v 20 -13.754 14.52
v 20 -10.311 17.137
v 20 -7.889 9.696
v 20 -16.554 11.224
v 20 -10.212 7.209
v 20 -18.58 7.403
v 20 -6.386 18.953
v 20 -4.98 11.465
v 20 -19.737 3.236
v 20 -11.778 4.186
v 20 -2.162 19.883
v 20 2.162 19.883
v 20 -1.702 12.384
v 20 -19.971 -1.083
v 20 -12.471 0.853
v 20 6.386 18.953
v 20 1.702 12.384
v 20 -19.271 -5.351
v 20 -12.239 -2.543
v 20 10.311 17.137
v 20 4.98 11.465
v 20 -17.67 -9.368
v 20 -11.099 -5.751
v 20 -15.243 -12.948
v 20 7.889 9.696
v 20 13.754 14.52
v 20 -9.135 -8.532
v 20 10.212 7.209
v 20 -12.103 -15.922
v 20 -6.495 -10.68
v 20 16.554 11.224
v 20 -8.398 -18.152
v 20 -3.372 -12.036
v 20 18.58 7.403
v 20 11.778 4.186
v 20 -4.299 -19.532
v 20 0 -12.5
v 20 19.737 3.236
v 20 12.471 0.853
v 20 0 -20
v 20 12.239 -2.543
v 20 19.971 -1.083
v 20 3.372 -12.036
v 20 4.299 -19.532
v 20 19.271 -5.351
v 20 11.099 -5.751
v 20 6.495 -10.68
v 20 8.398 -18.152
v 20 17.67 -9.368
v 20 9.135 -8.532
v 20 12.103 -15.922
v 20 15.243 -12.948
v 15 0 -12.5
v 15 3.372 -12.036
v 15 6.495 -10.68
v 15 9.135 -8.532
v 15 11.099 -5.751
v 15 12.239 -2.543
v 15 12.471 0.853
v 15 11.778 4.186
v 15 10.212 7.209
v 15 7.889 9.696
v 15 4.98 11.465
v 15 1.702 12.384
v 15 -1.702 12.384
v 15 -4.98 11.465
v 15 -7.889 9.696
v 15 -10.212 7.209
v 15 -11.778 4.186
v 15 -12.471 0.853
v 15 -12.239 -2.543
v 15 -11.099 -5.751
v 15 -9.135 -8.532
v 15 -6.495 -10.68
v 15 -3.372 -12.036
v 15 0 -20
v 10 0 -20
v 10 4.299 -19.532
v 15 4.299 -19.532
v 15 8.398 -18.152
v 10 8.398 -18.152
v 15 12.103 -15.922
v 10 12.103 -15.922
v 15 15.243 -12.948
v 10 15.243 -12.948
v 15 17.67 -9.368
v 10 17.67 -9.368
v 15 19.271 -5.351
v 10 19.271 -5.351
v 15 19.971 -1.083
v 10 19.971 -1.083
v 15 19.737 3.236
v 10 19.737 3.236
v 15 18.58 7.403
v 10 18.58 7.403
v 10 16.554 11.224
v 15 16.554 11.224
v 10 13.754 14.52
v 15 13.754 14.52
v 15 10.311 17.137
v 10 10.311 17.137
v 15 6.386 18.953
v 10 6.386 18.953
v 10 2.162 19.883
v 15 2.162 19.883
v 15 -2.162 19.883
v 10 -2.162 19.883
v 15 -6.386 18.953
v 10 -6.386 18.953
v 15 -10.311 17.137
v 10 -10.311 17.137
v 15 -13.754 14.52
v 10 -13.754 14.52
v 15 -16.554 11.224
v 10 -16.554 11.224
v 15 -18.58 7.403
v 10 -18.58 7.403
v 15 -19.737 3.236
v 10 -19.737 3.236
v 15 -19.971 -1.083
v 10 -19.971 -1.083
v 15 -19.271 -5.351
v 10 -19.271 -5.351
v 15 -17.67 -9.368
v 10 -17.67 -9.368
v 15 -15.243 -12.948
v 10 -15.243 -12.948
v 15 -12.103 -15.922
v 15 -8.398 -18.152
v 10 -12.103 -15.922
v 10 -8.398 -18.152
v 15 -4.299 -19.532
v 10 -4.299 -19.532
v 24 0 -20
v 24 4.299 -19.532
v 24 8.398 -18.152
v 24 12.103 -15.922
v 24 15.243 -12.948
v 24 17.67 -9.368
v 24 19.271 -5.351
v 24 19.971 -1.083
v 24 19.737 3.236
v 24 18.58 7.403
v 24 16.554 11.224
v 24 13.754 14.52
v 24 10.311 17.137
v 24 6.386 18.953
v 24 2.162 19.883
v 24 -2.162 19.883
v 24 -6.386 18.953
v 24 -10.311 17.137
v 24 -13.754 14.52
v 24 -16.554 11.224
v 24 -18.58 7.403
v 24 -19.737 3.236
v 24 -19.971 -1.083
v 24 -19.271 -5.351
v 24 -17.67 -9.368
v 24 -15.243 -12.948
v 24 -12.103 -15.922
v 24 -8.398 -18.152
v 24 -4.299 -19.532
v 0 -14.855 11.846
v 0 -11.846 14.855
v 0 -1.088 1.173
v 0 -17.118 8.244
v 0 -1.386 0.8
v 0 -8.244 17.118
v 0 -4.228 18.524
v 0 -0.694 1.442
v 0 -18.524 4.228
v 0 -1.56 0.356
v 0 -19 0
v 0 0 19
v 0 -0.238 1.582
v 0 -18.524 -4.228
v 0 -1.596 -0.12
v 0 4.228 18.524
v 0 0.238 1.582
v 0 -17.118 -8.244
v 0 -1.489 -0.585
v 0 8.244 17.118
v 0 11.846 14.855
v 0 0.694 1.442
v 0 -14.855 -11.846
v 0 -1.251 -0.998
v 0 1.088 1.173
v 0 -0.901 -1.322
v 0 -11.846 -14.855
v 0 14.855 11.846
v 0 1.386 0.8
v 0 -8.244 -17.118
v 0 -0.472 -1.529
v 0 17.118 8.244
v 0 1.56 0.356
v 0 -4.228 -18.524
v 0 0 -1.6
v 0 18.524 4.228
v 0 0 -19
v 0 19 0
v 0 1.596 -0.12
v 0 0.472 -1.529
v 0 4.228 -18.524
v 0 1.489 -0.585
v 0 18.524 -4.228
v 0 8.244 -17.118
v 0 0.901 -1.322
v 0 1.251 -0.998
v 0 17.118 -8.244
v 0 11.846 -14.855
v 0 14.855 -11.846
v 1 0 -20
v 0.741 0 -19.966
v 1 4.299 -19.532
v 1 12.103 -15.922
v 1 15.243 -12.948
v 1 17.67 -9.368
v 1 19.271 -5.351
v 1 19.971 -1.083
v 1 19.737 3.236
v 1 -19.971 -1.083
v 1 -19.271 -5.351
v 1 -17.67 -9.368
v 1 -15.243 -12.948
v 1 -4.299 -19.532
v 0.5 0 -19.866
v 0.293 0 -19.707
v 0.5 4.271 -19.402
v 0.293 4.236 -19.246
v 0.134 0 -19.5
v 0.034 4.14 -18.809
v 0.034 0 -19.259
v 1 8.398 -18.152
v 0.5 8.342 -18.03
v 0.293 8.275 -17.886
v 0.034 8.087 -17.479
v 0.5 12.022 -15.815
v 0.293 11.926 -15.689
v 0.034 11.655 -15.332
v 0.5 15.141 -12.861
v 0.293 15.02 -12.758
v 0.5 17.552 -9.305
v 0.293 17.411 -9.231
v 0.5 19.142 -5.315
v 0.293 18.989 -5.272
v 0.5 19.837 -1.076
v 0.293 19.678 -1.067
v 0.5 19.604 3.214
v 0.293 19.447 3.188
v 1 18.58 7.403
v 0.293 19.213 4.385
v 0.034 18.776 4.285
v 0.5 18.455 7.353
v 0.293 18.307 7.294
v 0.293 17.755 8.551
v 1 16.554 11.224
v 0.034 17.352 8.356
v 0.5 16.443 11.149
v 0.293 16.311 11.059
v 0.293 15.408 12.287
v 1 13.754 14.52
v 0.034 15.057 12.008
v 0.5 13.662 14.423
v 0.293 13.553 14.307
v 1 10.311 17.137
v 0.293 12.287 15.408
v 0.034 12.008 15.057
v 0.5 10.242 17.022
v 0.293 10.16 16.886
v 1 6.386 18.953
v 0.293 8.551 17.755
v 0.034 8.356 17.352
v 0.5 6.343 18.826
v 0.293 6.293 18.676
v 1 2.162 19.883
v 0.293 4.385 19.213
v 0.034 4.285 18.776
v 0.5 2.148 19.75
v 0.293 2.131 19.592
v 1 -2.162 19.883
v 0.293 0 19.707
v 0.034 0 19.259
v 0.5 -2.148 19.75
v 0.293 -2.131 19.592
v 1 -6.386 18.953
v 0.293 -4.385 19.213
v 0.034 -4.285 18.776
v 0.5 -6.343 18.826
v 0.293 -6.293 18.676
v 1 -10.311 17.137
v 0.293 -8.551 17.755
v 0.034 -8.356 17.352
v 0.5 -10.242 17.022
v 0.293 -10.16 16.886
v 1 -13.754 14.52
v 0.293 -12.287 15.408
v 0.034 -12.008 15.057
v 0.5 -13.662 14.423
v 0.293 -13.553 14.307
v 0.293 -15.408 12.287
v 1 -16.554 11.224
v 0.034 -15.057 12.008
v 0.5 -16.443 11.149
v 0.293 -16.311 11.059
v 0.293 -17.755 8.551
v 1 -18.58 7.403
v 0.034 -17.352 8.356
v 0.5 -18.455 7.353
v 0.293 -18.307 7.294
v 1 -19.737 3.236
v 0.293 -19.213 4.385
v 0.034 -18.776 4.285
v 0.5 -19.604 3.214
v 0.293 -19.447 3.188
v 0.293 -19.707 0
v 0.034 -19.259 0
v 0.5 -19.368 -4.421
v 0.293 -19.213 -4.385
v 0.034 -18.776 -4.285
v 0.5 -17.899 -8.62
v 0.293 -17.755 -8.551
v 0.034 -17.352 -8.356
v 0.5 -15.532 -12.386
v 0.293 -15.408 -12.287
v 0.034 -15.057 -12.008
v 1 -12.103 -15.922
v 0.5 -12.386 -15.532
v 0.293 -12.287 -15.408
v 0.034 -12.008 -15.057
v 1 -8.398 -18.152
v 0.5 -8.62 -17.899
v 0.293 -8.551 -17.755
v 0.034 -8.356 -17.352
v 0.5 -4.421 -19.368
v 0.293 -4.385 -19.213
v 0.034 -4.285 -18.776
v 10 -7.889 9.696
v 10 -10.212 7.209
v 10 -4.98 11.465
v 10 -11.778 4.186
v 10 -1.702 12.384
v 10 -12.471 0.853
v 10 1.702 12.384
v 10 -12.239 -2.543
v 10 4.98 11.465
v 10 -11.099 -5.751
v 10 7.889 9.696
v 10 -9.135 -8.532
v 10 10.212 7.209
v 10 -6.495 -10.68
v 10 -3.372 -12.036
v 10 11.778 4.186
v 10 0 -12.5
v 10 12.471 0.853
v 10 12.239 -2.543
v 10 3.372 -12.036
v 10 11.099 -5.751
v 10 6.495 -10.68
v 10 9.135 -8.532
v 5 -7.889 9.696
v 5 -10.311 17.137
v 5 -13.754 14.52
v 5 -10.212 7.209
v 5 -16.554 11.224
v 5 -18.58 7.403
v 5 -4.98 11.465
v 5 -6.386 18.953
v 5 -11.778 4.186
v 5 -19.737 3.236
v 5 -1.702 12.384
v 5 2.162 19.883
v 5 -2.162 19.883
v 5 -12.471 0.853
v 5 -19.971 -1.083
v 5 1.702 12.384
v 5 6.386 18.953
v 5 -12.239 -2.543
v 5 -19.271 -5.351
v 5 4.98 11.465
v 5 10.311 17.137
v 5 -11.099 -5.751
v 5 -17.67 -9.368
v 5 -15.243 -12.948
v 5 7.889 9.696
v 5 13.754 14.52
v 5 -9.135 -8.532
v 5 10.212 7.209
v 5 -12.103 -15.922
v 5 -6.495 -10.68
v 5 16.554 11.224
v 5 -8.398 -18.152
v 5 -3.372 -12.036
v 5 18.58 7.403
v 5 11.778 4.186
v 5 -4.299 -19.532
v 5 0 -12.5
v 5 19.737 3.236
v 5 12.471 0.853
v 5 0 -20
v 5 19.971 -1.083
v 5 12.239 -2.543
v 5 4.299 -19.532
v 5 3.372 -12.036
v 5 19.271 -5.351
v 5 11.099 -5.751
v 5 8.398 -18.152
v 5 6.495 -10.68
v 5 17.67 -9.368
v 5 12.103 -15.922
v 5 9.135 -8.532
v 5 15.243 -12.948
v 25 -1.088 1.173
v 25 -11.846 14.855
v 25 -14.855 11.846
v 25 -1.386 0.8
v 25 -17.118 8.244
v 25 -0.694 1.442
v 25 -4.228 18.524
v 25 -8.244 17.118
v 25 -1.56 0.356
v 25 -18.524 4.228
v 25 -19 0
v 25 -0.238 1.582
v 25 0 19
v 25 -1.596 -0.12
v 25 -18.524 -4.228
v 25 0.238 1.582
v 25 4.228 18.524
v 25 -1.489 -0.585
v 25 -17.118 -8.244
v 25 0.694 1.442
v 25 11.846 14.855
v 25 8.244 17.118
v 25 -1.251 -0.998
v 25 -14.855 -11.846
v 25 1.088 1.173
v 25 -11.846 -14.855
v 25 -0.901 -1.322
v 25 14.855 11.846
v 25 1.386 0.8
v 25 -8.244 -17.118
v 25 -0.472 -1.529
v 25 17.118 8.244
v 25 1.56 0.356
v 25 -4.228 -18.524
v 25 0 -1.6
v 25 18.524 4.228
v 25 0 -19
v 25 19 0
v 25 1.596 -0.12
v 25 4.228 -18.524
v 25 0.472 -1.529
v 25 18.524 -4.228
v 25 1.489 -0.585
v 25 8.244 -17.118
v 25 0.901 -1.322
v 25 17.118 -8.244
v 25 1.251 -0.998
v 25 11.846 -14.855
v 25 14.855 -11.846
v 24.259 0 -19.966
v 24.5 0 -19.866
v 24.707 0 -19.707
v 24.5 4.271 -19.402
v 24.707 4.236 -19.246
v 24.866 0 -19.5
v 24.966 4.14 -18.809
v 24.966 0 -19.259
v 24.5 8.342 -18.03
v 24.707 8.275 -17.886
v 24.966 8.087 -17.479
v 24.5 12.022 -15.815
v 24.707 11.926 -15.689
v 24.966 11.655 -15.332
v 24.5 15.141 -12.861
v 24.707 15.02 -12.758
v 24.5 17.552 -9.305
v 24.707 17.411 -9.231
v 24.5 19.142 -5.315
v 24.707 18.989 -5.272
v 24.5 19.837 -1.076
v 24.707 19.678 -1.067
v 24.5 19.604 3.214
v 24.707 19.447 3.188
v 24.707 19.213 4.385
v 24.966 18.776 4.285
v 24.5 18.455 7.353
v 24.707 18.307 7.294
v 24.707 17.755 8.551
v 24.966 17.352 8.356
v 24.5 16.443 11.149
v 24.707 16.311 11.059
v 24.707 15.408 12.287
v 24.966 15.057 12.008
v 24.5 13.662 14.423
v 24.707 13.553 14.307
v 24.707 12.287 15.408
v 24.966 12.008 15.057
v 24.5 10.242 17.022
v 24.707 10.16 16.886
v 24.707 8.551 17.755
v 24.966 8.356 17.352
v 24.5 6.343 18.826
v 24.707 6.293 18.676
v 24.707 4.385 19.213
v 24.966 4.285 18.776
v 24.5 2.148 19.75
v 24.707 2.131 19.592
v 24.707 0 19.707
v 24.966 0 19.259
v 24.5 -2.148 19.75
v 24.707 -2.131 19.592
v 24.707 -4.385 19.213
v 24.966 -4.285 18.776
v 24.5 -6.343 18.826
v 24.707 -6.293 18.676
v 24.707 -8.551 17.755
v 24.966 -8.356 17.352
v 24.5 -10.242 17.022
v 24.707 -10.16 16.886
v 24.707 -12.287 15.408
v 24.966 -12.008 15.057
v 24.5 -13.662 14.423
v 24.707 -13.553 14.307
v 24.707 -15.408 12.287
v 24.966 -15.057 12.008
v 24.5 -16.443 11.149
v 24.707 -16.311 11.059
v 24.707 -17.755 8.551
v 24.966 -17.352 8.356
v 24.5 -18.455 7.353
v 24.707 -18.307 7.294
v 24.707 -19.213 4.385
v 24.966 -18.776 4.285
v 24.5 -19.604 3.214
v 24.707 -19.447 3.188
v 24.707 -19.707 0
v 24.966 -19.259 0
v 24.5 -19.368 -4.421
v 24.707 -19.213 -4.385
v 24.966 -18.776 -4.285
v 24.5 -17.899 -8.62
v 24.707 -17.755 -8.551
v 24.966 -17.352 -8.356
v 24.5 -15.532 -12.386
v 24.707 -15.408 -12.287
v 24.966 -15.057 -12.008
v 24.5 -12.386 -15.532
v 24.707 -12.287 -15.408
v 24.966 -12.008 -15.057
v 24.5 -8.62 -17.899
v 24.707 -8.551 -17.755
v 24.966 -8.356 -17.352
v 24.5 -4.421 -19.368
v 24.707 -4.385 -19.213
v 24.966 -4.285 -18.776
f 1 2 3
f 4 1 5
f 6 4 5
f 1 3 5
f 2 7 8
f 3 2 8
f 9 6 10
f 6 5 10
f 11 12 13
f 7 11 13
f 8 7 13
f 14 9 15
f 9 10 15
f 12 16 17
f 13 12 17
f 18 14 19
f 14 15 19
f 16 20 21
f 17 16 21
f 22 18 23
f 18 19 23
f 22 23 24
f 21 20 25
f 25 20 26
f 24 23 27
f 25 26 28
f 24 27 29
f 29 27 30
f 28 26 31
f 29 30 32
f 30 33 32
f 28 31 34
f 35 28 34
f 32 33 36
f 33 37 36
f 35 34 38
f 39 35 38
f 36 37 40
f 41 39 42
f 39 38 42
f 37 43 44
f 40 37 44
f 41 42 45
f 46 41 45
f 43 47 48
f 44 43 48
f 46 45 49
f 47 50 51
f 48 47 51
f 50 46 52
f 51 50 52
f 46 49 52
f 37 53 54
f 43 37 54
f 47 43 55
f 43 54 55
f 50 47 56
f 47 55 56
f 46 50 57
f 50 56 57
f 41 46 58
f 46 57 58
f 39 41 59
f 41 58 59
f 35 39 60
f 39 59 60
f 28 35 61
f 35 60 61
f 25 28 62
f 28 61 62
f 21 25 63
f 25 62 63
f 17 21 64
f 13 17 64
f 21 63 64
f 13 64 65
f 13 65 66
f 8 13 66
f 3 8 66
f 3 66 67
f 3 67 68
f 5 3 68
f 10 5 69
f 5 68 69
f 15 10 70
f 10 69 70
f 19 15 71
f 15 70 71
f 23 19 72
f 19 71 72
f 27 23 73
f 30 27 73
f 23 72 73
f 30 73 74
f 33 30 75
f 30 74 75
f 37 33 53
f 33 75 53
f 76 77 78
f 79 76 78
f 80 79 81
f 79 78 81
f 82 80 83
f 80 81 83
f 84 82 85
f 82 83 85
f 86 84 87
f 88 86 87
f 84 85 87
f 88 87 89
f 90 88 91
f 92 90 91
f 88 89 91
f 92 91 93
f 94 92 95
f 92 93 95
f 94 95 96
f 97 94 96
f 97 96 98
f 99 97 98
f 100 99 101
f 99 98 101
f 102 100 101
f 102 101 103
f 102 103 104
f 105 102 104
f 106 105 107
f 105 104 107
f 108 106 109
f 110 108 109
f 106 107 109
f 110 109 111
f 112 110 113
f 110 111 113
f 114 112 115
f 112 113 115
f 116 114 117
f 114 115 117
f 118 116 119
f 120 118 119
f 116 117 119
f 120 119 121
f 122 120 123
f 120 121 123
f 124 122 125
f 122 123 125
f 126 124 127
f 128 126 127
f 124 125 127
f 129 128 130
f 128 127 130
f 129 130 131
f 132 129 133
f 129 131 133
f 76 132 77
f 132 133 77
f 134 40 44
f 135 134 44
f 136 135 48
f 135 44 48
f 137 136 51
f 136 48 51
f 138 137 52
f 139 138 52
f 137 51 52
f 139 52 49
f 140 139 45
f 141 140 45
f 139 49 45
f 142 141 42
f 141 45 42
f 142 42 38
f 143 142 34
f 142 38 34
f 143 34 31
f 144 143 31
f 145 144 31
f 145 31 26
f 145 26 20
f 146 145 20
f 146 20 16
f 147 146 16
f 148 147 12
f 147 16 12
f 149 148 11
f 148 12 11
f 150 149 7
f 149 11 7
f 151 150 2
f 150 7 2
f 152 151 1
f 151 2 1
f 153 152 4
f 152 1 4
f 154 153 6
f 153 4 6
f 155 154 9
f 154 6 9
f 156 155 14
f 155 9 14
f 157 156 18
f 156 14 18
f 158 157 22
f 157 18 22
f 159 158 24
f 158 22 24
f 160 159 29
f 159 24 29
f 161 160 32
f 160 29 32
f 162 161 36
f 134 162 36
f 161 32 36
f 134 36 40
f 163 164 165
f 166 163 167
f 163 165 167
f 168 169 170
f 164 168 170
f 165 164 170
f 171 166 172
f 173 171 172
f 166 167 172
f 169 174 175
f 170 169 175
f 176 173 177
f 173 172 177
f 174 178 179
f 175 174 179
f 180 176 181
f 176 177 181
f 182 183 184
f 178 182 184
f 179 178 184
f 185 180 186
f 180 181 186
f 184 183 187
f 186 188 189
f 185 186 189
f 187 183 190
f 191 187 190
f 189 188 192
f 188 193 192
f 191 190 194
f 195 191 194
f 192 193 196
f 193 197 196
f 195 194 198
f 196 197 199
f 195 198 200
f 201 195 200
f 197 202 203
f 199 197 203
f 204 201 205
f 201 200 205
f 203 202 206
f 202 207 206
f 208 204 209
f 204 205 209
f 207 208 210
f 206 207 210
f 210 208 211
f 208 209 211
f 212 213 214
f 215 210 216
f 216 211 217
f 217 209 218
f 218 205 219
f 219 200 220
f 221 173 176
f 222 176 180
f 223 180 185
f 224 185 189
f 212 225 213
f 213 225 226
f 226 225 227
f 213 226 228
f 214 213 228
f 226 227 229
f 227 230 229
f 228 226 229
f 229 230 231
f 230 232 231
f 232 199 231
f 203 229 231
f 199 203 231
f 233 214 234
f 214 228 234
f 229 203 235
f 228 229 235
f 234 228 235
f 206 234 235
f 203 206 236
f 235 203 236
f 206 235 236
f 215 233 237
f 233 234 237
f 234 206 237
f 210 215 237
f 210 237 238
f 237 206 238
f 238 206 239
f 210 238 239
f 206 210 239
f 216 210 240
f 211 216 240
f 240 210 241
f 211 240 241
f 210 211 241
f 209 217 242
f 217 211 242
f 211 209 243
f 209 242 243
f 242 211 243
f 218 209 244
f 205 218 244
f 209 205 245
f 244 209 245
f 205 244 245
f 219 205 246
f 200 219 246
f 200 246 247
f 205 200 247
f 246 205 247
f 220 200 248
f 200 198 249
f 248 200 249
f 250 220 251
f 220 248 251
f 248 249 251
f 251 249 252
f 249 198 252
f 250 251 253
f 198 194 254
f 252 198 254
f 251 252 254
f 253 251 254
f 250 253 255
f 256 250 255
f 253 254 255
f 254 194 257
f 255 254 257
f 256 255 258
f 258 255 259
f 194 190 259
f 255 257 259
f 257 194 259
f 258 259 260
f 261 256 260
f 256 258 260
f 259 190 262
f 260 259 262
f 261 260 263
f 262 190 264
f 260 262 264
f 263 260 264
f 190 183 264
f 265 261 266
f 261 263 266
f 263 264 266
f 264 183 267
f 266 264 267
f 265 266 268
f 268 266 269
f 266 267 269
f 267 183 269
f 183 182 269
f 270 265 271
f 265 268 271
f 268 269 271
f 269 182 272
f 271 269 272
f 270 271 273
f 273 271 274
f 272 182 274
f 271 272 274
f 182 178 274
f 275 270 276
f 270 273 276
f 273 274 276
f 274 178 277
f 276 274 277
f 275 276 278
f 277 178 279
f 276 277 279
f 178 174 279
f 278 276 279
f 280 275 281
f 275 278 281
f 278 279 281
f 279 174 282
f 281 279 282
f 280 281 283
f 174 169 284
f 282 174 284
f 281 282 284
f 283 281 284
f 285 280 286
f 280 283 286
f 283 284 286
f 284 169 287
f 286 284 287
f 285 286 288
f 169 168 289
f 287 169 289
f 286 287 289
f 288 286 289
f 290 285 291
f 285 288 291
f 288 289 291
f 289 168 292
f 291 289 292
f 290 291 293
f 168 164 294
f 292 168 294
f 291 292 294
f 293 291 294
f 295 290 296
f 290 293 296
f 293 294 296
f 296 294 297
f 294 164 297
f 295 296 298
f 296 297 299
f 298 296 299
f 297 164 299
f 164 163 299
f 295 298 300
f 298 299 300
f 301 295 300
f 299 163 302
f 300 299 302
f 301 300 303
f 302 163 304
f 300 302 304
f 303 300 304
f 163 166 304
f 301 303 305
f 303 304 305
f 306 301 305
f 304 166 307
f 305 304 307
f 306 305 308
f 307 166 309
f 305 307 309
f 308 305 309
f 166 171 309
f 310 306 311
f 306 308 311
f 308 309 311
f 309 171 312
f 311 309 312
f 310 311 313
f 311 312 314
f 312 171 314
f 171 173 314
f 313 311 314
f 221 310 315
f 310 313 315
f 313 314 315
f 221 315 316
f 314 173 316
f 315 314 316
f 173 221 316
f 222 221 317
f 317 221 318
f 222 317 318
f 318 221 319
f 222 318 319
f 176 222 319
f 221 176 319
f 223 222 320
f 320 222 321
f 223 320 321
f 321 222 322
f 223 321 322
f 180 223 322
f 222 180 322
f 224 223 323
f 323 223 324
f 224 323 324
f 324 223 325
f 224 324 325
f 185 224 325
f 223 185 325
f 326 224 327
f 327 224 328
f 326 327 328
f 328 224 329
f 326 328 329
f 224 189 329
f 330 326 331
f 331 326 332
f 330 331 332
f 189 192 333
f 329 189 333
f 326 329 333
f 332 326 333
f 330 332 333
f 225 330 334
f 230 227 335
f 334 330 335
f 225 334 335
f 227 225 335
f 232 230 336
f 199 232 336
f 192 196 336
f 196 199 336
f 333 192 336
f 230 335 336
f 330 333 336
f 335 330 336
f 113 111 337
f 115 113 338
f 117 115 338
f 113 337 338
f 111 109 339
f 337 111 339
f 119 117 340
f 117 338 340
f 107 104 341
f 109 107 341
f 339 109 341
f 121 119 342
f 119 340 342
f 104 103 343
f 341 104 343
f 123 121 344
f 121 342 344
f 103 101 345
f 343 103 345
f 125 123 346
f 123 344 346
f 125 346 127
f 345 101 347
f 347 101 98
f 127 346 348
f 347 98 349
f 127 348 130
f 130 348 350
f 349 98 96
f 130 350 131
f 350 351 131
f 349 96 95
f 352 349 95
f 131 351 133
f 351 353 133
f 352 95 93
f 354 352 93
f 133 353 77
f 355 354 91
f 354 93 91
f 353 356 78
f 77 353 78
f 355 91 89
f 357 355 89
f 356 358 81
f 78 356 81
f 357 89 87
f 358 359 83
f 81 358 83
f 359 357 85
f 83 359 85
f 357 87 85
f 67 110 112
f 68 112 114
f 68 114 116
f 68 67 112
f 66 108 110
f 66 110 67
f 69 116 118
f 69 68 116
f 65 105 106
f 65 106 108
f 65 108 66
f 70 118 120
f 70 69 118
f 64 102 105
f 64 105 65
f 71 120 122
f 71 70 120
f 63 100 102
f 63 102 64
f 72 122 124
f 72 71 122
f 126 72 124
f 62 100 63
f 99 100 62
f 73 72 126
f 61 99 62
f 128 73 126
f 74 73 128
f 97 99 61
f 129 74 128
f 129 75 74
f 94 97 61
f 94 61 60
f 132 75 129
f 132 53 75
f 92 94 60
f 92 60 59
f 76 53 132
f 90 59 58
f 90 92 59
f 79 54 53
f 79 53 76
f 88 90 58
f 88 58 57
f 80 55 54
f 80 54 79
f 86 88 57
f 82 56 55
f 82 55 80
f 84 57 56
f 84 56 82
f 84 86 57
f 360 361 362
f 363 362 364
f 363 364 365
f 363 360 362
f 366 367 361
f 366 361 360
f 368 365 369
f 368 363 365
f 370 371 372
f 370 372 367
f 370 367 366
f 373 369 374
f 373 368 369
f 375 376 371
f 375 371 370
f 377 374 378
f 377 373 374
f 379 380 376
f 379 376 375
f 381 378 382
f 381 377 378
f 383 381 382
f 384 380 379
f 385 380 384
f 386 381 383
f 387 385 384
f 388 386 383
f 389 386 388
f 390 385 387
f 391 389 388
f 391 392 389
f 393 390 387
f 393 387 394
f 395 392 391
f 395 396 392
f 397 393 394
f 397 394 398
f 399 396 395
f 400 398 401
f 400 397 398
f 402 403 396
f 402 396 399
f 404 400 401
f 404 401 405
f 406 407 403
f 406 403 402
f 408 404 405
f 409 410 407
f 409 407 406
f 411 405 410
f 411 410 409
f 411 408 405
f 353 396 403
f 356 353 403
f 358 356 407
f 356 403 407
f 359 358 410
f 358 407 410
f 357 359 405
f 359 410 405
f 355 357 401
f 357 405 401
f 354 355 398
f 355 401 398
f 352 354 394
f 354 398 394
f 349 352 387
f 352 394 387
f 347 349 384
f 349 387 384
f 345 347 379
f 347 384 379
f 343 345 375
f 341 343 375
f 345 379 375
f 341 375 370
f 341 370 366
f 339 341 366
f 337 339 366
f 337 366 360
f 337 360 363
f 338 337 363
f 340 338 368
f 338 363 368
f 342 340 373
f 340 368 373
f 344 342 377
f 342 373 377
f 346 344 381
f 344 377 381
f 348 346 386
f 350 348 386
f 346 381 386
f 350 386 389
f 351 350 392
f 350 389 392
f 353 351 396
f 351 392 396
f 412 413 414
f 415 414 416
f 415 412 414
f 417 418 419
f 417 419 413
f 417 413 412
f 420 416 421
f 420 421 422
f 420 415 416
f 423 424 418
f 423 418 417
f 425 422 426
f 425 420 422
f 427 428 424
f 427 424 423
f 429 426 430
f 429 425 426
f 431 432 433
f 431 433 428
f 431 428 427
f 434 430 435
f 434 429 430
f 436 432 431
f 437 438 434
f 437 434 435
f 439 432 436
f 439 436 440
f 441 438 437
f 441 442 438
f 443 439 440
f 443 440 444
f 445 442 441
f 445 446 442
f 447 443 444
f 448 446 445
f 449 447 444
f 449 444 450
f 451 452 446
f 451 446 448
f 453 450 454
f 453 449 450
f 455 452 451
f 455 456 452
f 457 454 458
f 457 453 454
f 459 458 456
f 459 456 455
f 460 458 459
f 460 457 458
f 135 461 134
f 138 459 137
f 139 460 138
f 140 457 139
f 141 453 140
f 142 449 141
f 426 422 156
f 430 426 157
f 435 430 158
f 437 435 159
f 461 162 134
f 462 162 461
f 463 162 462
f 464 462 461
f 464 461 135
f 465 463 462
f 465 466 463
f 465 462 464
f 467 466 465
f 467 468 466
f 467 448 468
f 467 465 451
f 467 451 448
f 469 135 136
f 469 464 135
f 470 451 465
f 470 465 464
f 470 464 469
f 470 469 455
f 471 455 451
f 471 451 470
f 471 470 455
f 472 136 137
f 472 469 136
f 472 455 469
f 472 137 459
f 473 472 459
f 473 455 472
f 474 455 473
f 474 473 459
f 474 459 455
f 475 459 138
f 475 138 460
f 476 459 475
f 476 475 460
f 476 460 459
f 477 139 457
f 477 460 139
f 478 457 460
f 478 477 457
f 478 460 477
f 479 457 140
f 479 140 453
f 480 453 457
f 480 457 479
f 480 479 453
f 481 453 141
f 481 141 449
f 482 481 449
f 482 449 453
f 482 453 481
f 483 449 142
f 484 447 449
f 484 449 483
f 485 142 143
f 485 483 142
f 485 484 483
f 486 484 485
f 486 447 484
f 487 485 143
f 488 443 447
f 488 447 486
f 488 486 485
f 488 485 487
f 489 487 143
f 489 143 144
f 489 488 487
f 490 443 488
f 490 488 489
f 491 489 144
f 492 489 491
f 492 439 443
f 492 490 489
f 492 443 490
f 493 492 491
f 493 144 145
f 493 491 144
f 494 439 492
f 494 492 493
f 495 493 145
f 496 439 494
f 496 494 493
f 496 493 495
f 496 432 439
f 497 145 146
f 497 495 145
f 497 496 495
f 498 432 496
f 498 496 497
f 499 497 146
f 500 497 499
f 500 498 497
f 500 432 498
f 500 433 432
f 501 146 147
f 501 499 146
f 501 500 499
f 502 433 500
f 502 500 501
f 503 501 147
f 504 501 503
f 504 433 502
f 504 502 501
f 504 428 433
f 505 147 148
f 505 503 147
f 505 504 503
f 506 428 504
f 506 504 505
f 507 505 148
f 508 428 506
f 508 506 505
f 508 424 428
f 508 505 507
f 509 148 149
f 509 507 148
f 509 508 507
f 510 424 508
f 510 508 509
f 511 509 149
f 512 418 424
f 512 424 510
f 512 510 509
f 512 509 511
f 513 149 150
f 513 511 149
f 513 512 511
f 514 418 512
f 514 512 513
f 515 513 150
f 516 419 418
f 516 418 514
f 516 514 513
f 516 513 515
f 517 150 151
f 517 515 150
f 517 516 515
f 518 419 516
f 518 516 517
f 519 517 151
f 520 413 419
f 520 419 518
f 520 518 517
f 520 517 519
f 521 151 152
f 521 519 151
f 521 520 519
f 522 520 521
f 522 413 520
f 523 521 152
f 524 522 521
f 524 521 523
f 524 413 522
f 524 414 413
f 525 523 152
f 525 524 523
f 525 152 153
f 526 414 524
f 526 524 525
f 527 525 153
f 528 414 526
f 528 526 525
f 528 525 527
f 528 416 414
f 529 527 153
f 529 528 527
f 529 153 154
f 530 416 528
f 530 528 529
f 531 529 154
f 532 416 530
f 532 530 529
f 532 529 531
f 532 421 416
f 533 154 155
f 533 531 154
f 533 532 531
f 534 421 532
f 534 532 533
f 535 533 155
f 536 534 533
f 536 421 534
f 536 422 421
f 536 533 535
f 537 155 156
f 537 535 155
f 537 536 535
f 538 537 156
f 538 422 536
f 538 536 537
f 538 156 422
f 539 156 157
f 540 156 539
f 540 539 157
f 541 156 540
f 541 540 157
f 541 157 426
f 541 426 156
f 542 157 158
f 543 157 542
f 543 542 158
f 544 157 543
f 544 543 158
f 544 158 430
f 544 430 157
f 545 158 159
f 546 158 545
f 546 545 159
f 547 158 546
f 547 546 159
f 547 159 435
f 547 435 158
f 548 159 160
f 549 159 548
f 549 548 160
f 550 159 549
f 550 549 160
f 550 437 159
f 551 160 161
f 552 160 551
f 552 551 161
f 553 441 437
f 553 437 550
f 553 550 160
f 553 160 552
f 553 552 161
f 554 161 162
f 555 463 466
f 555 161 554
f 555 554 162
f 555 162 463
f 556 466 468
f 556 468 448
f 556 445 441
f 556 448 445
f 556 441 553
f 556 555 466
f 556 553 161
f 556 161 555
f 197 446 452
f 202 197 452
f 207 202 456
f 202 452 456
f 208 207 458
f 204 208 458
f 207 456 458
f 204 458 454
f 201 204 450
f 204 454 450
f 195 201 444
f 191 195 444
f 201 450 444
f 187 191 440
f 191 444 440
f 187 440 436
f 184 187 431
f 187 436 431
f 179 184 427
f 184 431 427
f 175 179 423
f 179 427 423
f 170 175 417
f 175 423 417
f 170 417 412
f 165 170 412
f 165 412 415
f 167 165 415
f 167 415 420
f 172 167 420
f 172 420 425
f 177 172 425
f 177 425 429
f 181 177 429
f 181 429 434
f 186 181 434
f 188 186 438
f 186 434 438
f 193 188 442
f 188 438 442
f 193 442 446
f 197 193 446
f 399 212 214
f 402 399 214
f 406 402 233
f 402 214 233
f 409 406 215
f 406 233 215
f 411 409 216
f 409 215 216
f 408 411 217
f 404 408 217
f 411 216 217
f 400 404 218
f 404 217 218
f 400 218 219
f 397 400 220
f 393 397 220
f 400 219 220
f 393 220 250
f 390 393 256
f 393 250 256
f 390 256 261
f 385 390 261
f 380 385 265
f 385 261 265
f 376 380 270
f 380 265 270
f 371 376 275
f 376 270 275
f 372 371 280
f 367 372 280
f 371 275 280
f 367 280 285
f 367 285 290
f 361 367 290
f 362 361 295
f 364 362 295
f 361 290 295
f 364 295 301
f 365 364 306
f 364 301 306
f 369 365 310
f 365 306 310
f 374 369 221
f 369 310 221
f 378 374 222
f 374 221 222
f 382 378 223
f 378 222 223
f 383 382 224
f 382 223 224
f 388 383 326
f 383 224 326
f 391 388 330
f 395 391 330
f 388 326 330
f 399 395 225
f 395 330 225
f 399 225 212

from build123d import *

# Parameters (mm, degrees)
SKETCH1_R           = 20
BOSS_EXTRUDE1_DEPTH = 5
SKETCH2_R           = 12.5
BOSS_EXTRUDE2_DEPTH = 5
SKETCH3_R           = 20
BOSS_EXTRUDE3_DEPTH = 5
SKETCH4_R           = 12.5
BOSS_EXTRUDE4_DEPTH = 5
SKETCH5_R           = 20
BOSS_EXTRUDE5_DEPTH = 5
FILLET1_R           = 1
SKETCH6_R           = 1.6
CUT_EXTRUDE1_DEPTH  = 25


with BuildPart() as part:
    # Sketch1 → Boss-Extrude1 (new body)
    with BuildSketch(Plane(origin=(0, 0, 0), x_dir=(0, 0, -1), z_dir=(1, 0, 0))):
        Circle(SKETCH1_R)
    extrude(amount=BOSS_EXTRUDE1_DEPTH)

    # Sketch2 → Boss-Extrude2 (add)
    with BuildSketch(Plane(origin=(5, 0, 0), x_dir=(0, 0, -1), z_dir=(1, 0, 0))):
        Circle(SKETCH2_R)
    extrude(amount=BOSS_EXTRUDE2_DEPTH)

    # Sketch3 → Boss-Extrude3 (add)
    with BuildSketch(Plane(origin=(10, 0, 0), x_dir=(0, 0, -1), z_dir=(1, 0, 0))):
        Circle(SKETCH3_R)
    extrude(amount=BOSS_EXTRUDE3_DEPTH)

    # Sketch4 → Boss-Extrude4 (add)
    with BuildSketch(Plane(origin=(15, 0, 0), x_dir=(0, 0, -1), z_dir=(1, 0, 0))):
        Circle(SKETCH4_R)
    extrude(amount=BOSS_EXTRUDE4_DEPTH)

    # Sketch5 → Boss-Extrude5 (add)
    with BuildSketch(Plane(origin=(20, 0, 0), x_dir=(0, 0, -1), z_dir=(1, 0, 0))):
        Circle(SKETCH5_R)
    extrude(amount=BOSS_EXTRUDE5_DEPTH)

    # Fillet1
    fillet1_edges = [part.edges().sort_by_distance(p)[0] for p in [
        (25, 0, 20),
        (0, 0, 20),
    ]]
    fillet(fillet1_edges, radius=FILLET1_R)

    # Sketch6 → Cut-Extrude1 (cut)
    with BuildSketch(Plane(origin=(25, 0, 0), x_dir=(0, 0, -1), z_dir=(1, 0, 0))):
        Circle(SKETCH6_R)
    extrude(amount=-CUT_EXTRUDE1_DEPTH, mode=Mode.SUBTRACT)


solid = part.part
